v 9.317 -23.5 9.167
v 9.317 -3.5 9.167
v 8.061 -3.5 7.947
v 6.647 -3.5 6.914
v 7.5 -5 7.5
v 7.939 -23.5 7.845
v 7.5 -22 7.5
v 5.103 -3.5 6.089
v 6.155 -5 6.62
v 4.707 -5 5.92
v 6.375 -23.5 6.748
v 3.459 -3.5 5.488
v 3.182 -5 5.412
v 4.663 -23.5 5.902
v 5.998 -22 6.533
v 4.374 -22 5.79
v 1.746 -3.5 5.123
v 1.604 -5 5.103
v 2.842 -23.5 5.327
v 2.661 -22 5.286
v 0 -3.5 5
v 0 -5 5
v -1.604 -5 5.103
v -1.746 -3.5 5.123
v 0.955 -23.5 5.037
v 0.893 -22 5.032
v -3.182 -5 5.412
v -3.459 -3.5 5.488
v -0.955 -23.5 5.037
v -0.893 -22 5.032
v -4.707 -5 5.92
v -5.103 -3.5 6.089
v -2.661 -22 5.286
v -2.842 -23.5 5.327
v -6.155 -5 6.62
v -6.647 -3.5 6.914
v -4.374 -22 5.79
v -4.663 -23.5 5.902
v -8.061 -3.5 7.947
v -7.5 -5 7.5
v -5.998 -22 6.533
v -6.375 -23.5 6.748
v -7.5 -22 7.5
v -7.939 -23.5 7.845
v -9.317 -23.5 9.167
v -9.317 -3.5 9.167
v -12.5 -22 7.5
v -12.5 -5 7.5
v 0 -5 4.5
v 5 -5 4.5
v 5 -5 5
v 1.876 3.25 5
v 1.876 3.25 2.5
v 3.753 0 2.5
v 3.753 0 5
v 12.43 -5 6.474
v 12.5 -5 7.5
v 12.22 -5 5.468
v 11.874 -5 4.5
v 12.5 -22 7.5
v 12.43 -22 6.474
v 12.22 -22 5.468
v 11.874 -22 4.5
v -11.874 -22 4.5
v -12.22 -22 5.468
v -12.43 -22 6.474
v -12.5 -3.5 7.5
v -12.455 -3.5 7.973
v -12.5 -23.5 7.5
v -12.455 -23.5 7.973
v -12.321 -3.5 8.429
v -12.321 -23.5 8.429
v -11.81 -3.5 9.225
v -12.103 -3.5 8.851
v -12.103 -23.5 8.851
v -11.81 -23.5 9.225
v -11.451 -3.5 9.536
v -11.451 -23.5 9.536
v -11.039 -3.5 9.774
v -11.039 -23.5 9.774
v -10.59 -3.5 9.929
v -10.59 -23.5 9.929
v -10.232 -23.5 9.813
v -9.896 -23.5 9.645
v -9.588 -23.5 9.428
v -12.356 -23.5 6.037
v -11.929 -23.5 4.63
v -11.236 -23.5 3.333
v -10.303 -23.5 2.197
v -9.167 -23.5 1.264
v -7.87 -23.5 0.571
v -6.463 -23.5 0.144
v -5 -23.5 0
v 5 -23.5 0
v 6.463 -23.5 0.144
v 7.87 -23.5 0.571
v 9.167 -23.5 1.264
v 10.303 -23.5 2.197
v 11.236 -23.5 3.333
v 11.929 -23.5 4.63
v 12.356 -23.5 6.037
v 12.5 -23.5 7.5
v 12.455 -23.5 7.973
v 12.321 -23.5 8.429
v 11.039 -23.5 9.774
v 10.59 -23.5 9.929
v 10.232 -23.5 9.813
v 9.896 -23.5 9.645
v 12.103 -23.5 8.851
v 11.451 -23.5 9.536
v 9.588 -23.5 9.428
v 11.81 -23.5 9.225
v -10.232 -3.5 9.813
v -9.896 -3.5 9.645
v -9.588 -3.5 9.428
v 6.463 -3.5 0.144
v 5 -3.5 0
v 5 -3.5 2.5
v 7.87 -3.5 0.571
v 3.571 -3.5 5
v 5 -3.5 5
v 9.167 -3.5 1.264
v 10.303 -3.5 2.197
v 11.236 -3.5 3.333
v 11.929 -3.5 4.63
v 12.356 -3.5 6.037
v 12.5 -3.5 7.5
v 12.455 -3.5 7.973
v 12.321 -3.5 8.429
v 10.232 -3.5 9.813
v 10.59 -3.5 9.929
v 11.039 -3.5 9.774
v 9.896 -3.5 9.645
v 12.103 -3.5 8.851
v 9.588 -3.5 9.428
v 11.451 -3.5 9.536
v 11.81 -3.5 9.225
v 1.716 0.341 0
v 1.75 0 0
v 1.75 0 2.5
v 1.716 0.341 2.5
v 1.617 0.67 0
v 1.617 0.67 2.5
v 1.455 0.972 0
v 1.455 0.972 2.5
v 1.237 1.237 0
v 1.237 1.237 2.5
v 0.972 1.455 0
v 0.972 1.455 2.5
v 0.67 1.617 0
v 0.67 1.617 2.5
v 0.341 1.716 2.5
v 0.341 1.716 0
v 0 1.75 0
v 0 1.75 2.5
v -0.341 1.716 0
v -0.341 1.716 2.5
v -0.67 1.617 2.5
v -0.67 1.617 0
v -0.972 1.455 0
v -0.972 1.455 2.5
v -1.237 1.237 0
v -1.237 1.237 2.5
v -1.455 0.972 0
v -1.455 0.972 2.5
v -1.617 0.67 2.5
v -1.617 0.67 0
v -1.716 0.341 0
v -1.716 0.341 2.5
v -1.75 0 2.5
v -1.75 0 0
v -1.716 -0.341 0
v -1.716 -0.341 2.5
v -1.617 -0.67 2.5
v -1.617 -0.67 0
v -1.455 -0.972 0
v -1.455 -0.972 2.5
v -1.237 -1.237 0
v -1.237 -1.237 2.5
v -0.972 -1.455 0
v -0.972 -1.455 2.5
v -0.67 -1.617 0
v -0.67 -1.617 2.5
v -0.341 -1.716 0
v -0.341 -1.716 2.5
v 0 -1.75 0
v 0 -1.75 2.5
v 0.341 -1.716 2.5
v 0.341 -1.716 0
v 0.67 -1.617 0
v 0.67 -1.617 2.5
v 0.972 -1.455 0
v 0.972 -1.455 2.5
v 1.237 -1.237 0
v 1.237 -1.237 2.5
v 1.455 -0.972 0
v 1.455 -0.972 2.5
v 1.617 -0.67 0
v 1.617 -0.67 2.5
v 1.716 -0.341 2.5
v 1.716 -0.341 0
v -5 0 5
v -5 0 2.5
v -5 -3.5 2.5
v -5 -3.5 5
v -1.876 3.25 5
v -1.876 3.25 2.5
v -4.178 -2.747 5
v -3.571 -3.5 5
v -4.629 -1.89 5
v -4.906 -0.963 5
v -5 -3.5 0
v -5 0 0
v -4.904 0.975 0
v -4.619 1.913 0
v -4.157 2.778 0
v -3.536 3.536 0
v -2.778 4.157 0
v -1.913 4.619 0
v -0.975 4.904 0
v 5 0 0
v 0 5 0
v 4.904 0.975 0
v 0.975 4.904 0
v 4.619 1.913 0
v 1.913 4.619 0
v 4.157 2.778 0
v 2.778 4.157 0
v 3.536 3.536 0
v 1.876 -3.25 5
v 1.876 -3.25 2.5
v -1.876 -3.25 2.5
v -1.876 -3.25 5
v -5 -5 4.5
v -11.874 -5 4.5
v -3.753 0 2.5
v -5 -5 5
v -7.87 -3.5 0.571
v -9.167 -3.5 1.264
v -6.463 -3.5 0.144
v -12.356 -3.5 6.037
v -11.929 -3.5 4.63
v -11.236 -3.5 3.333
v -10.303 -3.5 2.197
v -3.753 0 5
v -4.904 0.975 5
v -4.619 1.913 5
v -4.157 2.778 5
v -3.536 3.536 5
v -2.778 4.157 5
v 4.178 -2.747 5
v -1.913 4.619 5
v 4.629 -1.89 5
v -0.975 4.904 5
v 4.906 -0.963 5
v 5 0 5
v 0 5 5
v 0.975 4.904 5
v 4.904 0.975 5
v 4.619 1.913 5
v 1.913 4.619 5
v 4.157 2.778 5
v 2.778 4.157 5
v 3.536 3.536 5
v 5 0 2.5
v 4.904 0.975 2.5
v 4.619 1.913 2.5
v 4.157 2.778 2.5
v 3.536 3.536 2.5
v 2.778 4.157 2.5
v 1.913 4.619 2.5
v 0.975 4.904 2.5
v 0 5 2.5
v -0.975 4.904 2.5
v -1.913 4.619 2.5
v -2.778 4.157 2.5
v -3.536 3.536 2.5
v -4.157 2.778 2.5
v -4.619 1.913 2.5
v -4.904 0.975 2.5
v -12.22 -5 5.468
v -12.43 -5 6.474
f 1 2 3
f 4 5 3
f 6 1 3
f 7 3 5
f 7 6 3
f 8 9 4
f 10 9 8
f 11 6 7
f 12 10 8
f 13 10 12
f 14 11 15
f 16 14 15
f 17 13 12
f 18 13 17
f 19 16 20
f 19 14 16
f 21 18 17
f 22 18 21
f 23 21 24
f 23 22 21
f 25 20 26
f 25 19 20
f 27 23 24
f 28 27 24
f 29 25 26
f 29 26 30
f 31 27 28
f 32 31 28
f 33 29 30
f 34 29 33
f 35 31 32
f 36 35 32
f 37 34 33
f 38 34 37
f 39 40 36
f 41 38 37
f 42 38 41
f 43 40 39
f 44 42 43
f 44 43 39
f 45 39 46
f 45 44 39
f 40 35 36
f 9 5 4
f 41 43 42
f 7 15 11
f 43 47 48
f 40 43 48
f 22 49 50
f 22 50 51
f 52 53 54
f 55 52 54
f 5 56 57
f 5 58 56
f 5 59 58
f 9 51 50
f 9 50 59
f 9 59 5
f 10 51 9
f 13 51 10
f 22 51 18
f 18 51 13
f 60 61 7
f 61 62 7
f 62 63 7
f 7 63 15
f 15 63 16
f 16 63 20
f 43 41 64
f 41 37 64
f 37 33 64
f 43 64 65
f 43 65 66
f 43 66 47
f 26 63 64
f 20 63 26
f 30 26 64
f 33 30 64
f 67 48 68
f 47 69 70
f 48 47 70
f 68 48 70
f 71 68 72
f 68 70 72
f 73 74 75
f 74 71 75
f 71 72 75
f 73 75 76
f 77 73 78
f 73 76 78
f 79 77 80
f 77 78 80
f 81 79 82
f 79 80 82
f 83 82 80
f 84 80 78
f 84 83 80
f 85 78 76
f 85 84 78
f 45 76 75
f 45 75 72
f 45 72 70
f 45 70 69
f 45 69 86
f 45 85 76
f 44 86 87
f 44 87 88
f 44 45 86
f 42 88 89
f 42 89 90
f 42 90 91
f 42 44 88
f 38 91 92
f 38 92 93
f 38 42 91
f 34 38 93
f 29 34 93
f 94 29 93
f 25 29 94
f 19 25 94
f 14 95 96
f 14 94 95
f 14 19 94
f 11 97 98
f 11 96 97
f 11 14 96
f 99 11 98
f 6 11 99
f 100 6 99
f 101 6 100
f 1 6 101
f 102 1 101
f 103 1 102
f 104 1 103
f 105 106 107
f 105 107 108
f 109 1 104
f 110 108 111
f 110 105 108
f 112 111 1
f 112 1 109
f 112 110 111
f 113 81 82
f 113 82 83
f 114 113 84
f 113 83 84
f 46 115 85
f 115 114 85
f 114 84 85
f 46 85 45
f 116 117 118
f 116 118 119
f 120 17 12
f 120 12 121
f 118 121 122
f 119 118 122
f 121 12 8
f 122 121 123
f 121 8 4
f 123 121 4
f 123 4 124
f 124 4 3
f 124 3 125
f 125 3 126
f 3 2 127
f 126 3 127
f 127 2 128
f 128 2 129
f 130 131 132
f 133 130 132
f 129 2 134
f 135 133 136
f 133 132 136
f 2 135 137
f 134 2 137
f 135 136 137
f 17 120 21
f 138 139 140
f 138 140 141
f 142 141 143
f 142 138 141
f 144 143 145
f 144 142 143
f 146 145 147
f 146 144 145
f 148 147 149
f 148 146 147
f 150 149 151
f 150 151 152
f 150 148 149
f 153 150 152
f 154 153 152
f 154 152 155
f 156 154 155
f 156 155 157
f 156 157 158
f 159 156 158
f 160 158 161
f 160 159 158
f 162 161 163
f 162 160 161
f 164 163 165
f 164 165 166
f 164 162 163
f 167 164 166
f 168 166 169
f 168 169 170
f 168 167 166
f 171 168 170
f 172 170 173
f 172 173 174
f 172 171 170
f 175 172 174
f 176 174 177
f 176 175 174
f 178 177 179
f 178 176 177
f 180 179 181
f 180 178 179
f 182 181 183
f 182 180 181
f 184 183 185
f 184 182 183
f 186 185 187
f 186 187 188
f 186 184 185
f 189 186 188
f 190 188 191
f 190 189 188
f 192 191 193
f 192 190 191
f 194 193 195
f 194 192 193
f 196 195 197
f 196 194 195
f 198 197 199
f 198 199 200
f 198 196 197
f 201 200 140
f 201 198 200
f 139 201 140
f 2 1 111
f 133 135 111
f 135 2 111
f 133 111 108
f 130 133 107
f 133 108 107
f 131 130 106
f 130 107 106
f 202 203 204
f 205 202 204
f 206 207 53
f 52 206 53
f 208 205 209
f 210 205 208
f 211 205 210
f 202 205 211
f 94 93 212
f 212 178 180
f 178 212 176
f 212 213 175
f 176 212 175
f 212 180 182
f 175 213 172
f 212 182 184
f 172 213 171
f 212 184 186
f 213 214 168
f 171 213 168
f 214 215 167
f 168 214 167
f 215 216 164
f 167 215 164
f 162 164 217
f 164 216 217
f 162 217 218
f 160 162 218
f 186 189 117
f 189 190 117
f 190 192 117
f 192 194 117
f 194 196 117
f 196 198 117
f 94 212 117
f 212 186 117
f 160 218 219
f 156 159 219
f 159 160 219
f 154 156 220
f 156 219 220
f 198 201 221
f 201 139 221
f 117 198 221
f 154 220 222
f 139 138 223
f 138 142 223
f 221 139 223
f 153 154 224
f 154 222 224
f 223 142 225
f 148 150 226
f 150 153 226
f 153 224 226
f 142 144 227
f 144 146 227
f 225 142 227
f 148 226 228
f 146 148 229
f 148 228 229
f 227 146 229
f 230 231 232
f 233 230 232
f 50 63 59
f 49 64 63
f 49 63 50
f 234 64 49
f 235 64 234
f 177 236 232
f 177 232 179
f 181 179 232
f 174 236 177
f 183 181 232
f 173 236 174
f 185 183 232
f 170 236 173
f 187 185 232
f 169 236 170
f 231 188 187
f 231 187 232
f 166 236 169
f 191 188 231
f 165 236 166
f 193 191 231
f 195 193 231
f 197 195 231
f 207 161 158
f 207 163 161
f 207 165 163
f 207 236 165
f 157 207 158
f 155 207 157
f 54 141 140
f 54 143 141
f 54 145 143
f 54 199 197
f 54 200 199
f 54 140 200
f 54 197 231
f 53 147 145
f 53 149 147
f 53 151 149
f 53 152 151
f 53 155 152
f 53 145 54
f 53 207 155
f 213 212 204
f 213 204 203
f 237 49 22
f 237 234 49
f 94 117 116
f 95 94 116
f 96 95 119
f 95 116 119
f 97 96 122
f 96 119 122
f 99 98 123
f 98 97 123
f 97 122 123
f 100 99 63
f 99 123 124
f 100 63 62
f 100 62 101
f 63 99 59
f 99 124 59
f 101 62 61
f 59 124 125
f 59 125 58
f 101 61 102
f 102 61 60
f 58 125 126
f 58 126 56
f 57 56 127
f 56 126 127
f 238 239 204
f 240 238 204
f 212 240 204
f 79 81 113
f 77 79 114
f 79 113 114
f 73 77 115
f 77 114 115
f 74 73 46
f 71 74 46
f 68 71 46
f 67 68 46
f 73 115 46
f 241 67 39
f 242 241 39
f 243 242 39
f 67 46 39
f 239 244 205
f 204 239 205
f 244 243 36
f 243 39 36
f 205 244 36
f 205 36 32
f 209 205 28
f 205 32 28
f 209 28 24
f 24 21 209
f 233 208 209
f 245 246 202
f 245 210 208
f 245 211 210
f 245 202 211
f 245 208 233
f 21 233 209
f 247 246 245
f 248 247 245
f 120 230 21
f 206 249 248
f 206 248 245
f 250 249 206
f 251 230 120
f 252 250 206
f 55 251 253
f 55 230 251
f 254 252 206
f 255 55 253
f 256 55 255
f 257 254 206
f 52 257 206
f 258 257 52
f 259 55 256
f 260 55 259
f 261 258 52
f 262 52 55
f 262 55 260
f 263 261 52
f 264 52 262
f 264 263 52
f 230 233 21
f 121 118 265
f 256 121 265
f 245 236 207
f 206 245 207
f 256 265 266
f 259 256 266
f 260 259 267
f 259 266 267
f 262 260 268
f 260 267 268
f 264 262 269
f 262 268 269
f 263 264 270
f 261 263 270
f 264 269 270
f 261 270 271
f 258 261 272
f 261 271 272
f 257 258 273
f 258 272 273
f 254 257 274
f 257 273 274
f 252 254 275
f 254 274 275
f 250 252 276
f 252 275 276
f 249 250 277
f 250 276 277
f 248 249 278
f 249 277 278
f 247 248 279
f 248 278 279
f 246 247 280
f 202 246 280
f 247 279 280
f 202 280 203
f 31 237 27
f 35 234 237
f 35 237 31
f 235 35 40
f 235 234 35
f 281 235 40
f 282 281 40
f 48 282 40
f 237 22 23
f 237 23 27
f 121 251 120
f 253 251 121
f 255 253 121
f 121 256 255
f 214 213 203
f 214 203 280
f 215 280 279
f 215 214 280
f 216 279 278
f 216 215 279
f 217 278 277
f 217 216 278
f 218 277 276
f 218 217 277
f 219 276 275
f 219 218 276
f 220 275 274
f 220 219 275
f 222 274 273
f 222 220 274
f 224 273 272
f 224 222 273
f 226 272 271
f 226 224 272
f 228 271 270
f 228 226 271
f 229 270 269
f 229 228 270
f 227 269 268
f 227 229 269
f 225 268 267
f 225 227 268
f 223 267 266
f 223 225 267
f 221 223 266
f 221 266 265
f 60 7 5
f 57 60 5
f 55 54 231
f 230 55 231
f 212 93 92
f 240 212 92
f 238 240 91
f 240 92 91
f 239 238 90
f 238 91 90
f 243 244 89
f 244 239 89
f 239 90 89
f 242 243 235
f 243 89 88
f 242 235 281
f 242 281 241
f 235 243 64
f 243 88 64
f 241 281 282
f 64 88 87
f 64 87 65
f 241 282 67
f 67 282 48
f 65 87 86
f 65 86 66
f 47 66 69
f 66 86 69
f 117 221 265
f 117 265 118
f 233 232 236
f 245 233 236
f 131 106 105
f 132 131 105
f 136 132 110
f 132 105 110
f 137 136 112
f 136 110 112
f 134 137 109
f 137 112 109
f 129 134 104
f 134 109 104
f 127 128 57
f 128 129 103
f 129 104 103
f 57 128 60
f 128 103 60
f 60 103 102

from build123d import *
from build123d.topology import SkipClean

# Parameters (mm, degrees)
ESBO_O1_R                = 1.75
ESBO_O1_W                = 25
ESBO_O1_H                = 20
RESSALTO_EXTRUS_O1_DEPTH = 2.5
RESSALTO_EXTRUS_O2_DEPTH = 20
ESBO_O4_W                = 3
ESBO_O4_H                = 17
CORTE_EXTRUS_O1_DEPTH    = 39
FILETE1_R                = 7.5
FILETE2_R                = 2.5
RESSALTO_EXTRUS_O3_DEPTH = 2.5


with BuildPart() as part:
    # Esboço1 → Ressalto-extrusão1 (new body)
    # profile 1 of 2: a face of its own
    with BuildSketch(Plane.XY):
        with BuildLine():
            Line((5, 0), (5, -3.5))
            Line((5, -3.5), (-5, -3.5))
            Line((-5, -3.5), (-5, 0))
            ThreePointArc((-5, 0), (0, 5), (5, 0))
        make_face()
        Circle(ESBO_O1_R, mode=Mode.SUBTRACT)
    # profile 2 of 2: a face of its own
    with BuildSketch(Plane.XY):
        with Locations((0, -13.5)):
            Rectangle(ESBO_O1_W, ESBO_O1_H)
    extrude(amount=RESSALTO_EXTRUS_O1_DEPTH)

    # Esboço3 → Ressalto-extrusão2 (add)
    with BuildSketch(Plane.XZ.offset(23.5)):
        with BuildLine():
            Line((12.5, 10), (10, 10))
            ThreePointArc((10, 10), (0, 5), (-10, 10))
            Line((-10, 10), (-12.5, 10))
            Line((-12.5, 10), (-12.5, 2.5))
            Line((-12.5, 2.5), (12.5, 2.5))
            Line((12.5, 2.5), (12.5, 10))
        make_face()
    extrude(amount=-RESSALTO_EXTRUS_O2_DEPTH)

    # Esboço4 → Corte-extrusão1 (cut)
    with BuildSketch(Plane.ZY.offset(12.5)):
        with Locations((6, -13.5)):
            Rectangle(ESBO_O4_W, ESBO_O4_H)
    extrude(amount=-CORTE_EXTRUS_O1_DEPTH, mode=Mode.SUBTRACT)

    # Filete1
    # the kernel refuses this fillet: 7.5 mm, written as the material it takes off along each edge
    with BuildSketch(Plane(origin=(-12.5, -42.25, 0), x_dir=(1, 0, 0), z_dir=(0, 1, 0)), Plane(origin=(12.5, 15.25, 0), x_dir=(-1, 0, 0), z_dir=(0, -1, 0))) as filete1_piece_1:
        with BuildLine():
            CenterArc((FILETE1_R, -FILETE1_R), FILETE1_R, 90, 90)
            Line((0, -FILETE1_R), (0, 0))
            Line((0, 0), (FILETE1_R, 0))
        make_face()
    extrude(amount=57.5, mode=Mode.SUBTRACT)

    # Filete2
    # the kernel refuses this fillet: 2.5 mm, written as the material it takes off along each edge
    with BuildSketch(Plane(origin=(10, -26.450849719, 10), x_dir=(1, 0, 0), z_dir=(0, 1, 0))) as filete2_piece_1:
        with BuildLine():
            CenterArc((1.180339887, 2.5), FILETE2_R, 221.810314896, 48.189685104)
            ThreePointArc((-0.683050094, 0.833333333), (-0.332541723, 0.424029939), (0, 0))
            Line((0, 0), (1.180339887, 0))
        make_face()
    extrude(amount=25.901699437, mode=Mode.SUBTRACT)
    with BuildSketch(Plane(origin=(-10, -26.450849719, 10), x_dir=(0.6339223950926707, 0, -0.7733966621339738), z_dir=(0, 1, 0))) as filete2_piece_2:
        with BuildLine():
            CenterArc((1.185247767, 2.497676917), FILETE2_R, 219.340106271, 48.189685104)
            Line((-0.748243889, 0.912870929), (0, 0))
            ThreePointArc((0, 0), (0.538748985, 0.011615415), (1.07749797, 0))
        make_face()
    extrude(amount=25.901699437, mode=Mode.SUBTRACT)
    with BuildSketch(Plane(origin=(12.5, -29.75, 10), x_dir=(0, 0, -1), z_dir=(0, 1, 0)), Plane(origin=(-12.5, -29.75, 10), x_dir=(1, 0, 0), z_dir=(0, 1, 0))) as filete2_piece_3:
        with BuildLine():
            CenterArc((FILETE2_R, FILETE2_R), FILETE2_R, 180, 90)
            Line((0, FILETE2_R), (0, 0))
            Line((0, 0), (FILETE2_R, 0))
        make_face()
    extrude(amount=32.5, mode=Mode.SUBTRACT)

    # Esboço5 → Ressalto-extrusão3 (add)
    # profile 1 of 6: a face of its own
    with SkipClean():  # the faces are left unmerged after this step: merging them gives an invalid solid
        with BuildSketch(Plane.XY.offset(2.5)):
            with BuildLine():
                ThreePointArc((-3.570714214, -3.5), (-4.628907596, -1.890294809), (-5, 0))
                Line((-5, 0), (-5, -3.5))
                Line((-5, -3.5), (-3.570714214, -3.5))
            make_face()
        # profile 2 of 6: a face of its own
        with BuildSketch(Plane.XY.offset(2.5)):
            with BuildLine():
                Line((5, -3.5), (5, 0))
                ThreePointArc((5, 0), (4.628907596, -1.890294809), (3.570714214, -3.5))
                Line((3.570714214, -3.5), (5, -3.5))
            make_face()
        # profile 3 of 6: a face of its own
        with BuildSketch(Plane.XY.offset(2.5)):
            with BuildLine():
                Line((5, -5), (5, -3.5))
                Line((5, -3.5), (3.570714214, -3.5))
                ThreePointArc((3.570714214, -3.5), (1.936491652, -4.609772238), (-4.7e-08, -5))
                Line((-4.7e-08, -5), (5, -5))
            make_face()
        # profile 4 of 6: a face of its own
        with BuildSketch(Plane.XY.offset(2.5)):
            with BuildLine():
                Line((-3.570714214, -3.5), (-5, -3.5))
                Line((-5, -3.5), (-5, -5))
                Line((-5, -5), (-4.7e-08, -5))
                ThreePointArc((-4.7e-08, -5), (-1.936491695, -4.60977222), (-3.570714214, -3.5))
            make_face()
        # profile 5 of 6: a face of its own
        with BuildSketch(Plane.XY.offset(2.5)):
            with BuildLine():
                Line((3.570714214, -3.5), (-3.570714214, -3.5))
                ThreePointArc((-3.570714214, -3.5), (-1.936491695, -4.60977222), (-4.7e-08, -5))
                ThreePointArc((-4.7e-08, -5), (1.936491652, -4.609772238), (3.570714214, -3.5))
            make_face()
        # profile 6 of 6: a face of its own
        with BuildSketch(Plane.XY.offset(2.5)):
            with BuildLine():
                ThreePointArc((5, 0), (0, 5), (-5, 0))
                ThreePointArc((-5, 0), (-4.628907596, -1.890294809), (-3.570714214, -3.5))
                Line((-3.570714214, -3.5), (3.570714214, -3.5))
                ThreePointArc((3.570714214, -3.5), (4.628907596, -1.890294809), (5, 0))
            make_face()
            Polygon((1.876388375, 3.25), (3.75277675, 0), (1.876388375, -3.25), (-1.876388375, -3.25), (-3.75277675, 0), (-1.876388375, 3.25), align=None, mode=Mode.SUBTRACT)
        extrude(amount=RESSALTO_EXTRUS_O3_DEPTH)


solid = part.part
